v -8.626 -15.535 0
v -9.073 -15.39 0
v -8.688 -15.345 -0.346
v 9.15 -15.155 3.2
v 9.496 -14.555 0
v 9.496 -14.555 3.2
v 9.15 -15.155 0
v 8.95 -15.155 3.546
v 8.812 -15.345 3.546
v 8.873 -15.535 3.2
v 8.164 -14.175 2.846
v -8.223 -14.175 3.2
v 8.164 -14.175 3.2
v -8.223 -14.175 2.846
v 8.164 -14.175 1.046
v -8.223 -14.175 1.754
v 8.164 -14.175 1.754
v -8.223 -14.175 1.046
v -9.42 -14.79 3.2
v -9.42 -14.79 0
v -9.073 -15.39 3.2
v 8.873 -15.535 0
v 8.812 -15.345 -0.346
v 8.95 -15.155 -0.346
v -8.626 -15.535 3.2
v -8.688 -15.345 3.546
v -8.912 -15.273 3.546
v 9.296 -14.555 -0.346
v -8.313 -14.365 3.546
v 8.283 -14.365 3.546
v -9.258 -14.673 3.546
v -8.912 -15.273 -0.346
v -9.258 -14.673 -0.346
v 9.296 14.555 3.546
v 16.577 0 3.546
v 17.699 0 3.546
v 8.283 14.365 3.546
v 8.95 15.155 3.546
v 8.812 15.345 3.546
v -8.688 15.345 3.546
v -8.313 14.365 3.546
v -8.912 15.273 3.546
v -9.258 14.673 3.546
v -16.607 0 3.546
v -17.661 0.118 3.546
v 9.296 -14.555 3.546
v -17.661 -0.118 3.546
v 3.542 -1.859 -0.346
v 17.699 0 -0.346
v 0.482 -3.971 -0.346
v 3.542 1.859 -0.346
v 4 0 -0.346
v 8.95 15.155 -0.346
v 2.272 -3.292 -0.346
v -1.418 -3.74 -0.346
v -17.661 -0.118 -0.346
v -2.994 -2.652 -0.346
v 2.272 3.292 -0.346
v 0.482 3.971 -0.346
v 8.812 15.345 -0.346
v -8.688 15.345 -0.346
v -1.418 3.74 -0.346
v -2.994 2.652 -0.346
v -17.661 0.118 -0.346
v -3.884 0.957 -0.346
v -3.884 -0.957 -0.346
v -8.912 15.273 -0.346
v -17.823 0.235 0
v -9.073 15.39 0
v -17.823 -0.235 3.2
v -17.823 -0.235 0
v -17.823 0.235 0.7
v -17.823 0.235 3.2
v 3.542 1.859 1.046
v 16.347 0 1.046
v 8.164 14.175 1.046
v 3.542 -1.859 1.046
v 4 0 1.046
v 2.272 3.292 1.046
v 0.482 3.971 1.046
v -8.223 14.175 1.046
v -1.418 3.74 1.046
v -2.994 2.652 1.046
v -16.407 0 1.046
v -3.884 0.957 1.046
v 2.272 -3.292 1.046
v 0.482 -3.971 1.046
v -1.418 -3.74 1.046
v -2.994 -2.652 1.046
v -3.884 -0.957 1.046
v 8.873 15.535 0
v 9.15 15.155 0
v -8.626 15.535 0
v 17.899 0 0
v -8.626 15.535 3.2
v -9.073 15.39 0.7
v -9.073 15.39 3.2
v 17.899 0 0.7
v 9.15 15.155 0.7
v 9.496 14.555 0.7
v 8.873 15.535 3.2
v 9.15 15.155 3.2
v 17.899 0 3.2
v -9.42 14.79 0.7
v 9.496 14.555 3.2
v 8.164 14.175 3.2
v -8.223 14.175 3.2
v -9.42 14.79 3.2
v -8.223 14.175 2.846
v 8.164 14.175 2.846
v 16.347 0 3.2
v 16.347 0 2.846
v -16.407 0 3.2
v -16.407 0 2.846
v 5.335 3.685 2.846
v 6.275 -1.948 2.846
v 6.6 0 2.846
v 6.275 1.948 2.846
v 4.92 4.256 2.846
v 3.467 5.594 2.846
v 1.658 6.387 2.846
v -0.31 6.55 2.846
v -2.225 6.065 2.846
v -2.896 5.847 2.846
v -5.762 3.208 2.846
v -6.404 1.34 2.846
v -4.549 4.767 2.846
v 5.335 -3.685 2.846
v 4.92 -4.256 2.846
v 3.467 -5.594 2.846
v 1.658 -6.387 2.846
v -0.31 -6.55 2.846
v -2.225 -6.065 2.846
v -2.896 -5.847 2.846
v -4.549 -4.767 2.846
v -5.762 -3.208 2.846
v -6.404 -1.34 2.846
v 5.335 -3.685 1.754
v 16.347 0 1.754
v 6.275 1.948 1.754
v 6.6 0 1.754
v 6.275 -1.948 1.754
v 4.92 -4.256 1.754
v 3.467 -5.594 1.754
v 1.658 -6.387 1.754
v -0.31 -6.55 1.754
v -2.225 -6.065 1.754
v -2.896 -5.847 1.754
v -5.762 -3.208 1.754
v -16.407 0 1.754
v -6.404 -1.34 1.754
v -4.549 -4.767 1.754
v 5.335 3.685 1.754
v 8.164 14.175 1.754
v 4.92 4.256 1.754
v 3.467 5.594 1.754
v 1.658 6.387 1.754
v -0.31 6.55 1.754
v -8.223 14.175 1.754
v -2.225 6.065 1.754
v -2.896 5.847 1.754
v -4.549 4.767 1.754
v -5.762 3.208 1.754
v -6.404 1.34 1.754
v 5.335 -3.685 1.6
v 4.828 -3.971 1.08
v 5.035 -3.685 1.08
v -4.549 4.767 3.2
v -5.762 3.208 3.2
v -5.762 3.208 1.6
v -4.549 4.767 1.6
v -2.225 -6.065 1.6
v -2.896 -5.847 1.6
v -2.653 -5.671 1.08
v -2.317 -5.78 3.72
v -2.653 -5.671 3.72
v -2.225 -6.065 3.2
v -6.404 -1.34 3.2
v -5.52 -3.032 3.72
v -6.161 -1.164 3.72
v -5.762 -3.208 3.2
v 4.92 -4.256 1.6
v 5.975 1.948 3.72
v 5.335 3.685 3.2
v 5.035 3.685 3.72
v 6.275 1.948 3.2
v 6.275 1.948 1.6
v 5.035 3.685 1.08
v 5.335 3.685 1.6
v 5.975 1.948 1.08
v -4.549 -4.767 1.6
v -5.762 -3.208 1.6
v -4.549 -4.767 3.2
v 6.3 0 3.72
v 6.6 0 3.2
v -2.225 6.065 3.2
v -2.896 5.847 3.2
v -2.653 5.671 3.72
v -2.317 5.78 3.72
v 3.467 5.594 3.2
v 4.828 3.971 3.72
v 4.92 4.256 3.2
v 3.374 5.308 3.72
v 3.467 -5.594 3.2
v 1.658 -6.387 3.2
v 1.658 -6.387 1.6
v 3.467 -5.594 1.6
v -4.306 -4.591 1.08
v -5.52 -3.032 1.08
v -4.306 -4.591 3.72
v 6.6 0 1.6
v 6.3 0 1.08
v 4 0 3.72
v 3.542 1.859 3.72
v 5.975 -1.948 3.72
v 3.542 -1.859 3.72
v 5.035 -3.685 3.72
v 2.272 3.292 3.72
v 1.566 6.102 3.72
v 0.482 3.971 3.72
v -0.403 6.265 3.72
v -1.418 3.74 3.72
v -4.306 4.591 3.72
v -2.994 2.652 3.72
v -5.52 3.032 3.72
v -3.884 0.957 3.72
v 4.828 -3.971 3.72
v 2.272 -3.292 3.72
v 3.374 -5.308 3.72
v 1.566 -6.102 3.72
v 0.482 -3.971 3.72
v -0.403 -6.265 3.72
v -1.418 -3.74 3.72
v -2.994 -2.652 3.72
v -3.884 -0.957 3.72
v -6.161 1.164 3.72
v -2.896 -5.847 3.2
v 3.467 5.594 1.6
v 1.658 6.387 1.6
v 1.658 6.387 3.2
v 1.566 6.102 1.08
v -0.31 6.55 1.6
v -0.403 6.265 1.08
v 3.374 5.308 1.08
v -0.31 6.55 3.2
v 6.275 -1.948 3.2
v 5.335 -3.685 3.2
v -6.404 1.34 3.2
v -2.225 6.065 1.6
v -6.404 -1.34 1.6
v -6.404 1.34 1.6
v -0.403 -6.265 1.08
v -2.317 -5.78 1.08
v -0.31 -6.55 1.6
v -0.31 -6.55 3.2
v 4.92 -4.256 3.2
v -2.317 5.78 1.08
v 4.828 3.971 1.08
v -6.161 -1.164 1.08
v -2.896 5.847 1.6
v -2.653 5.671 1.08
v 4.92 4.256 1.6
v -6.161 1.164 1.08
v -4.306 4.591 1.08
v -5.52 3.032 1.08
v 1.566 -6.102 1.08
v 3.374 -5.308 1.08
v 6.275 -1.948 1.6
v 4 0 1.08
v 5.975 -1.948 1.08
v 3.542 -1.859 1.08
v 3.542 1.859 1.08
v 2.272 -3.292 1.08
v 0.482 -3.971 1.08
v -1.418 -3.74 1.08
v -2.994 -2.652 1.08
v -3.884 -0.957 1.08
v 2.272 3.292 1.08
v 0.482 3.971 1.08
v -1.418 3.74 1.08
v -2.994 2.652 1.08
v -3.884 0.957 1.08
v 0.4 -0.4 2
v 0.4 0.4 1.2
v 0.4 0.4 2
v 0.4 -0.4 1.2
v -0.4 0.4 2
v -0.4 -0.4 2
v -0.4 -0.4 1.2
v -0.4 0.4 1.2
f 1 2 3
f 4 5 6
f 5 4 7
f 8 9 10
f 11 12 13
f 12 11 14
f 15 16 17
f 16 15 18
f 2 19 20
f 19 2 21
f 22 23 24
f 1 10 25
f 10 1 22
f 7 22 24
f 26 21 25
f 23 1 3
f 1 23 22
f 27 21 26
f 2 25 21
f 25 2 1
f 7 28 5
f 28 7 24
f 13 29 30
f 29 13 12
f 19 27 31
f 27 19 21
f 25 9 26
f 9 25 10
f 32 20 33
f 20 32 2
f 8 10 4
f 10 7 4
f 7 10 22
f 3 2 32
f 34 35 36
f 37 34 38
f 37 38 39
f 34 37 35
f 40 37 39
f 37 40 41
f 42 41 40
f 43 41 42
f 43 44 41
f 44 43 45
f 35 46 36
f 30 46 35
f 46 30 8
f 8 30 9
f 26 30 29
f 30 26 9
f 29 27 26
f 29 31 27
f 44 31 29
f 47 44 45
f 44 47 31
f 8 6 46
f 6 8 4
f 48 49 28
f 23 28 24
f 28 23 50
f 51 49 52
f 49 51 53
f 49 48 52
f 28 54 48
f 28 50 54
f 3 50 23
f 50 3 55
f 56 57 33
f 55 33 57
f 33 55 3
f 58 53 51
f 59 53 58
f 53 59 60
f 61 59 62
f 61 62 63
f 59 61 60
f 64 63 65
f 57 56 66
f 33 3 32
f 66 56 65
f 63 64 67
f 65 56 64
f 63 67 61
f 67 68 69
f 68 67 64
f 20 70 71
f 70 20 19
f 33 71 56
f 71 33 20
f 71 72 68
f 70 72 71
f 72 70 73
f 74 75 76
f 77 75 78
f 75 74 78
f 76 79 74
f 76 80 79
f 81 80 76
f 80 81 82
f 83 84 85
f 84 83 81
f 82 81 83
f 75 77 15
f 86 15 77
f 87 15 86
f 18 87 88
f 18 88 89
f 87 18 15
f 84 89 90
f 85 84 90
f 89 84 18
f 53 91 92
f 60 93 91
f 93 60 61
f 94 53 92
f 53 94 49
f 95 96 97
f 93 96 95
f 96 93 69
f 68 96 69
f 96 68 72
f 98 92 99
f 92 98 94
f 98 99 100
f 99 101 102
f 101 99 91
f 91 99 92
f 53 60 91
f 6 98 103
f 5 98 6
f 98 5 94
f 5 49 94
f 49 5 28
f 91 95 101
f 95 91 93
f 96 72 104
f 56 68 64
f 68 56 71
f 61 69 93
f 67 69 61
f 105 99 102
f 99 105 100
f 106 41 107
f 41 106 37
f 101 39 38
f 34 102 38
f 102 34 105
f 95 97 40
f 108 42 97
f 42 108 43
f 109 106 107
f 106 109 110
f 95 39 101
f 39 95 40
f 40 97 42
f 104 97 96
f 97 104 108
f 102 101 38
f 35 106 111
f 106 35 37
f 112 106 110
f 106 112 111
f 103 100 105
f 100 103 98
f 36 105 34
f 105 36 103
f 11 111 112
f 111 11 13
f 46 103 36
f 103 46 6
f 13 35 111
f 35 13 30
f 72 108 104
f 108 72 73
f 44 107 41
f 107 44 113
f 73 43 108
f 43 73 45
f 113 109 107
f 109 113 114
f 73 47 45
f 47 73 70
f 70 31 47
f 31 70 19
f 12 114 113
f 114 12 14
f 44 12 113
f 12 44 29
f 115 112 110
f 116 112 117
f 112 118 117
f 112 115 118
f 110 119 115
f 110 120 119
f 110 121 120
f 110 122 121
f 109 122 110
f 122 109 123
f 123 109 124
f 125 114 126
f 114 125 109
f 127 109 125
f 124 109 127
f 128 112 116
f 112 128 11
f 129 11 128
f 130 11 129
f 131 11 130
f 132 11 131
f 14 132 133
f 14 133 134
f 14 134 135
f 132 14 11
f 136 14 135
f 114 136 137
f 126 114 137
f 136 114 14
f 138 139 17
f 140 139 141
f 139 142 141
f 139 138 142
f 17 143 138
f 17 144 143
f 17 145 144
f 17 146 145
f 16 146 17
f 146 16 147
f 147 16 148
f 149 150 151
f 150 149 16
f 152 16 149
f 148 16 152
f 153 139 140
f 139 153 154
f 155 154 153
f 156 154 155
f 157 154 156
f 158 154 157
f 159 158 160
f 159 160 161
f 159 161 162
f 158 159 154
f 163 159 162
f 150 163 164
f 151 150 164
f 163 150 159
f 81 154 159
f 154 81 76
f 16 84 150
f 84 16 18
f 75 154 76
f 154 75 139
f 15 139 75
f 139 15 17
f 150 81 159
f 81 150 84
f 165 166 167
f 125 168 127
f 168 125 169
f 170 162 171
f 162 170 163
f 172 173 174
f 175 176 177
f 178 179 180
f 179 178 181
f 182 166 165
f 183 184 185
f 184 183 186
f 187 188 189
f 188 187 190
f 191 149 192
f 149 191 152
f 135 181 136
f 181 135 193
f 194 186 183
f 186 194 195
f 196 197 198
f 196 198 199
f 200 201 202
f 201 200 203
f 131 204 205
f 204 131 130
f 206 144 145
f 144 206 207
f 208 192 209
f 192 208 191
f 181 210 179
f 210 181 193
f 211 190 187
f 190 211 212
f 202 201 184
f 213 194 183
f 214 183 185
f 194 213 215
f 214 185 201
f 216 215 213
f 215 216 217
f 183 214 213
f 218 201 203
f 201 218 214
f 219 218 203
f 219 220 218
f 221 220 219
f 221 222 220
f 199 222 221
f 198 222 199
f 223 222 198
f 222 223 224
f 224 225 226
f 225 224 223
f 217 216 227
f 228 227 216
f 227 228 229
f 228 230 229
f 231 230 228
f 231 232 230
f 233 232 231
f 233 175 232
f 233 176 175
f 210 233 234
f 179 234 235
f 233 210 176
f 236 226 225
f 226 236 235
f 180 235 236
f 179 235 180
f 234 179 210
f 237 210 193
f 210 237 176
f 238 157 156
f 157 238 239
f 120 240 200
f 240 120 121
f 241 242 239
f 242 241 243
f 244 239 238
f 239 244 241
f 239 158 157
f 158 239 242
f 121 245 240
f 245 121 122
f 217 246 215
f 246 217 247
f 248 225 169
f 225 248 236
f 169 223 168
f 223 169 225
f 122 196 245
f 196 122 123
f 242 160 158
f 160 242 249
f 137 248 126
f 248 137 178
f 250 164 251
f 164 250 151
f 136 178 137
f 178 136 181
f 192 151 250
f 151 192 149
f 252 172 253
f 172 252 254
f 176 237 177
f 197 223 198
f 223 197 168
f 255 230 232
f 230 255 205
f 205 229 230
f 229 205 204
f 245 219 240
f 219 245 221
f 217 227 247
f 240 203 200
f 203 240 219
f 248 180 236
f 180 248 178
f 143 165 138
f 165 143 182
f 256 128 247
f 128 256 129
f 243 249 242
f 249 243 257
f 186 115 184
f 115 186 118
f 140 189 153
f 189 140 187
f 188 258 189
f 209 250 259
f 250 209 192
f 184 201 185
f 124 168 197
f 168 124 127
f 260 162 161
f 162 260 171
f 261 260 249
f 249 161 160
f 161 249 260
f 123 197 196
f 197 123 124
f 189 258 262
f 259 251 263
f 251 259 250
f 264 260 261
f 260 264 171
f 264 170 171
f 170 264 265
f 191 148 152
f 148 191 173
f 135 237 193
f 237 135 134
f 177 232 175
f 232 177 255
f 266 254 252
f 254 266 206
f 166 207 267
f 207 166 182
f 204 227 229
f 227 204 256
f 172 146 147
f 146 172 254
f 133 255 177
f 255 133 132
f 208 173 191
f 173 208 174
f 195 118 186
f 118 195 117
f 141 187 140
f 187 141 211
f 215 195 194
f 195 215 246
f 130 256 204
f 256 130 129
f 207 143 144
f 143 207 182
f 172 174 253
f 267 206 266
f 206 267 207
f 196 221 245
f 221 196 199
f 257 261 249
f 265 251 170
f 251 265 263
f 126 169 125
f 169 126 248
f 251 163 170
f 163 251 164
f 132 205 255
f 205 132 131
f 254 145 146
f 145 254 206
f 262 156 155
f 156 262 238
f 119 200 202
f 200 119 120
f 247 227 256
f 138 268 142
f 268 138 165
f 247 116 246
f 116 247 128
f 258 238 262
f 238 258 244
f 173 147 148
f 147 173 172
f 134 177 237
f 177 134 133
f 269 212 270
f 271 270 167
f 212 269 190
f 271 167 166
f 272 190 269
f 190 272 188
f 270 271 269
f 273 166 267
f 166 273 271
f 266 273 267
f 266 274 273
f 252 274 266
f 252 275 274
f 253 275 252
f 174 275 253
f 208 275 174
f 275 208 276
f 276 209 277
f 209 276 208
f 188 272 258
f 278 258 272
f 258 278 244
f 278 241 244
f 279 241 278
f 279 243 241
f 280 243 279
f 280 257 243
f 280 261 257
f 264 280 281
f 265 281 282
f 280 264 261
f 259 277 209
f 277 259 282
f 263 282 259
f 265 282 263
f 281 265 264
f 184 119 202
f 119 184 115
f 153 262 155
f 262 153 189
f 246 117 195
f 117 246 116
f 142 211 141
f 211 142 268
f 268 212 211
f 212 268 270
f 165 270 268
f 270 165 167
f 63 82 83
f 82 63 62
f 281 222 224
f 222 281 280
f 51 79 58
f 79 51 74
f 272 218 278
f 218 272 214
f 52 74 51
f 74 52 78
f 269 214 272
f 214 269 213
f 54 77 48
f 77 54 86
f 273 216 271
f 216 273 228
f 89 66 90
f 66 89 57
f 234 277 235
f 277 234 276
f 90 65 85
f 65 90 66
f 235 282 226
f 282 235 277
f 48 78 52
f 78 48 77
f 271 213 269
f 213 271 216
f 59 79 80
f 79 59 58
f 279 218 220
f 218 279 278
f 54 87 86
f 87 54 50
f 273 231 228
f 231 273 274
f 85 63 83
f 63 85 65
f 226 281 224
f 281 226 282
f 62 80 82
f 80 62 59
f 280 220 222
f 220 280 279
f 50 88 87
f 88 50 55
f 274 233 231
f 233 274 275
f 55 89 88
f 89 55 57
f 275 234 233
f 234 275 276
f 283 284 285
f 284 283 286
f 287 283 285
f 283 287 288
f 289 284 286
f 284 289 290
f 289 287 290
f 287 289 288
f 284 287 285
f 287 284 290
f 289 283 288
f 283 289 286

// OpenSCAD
// Parameters
bbox_X = 35.0; //[17.5:70.0:0.1]
bbox_Y = 30.31; //[15.155:60.62:0.01]
bbox_Z = 4.0; //[2.0:8.0:0.1]
plate_thk = 3.2; //[1.6:6.4:0.1]
hex_flat_to_flat = 30.31; //[15.155:60.62:0.01]
hole_d = 8.0; //[4.0:16.0:0.1]
boss_thk = 0.8; //[0.4:1.6:0.05]
boss_r = 6.0; //[3.0:12.0:0.1]
boss_offset_x = 0.0; //[-10.0:10.0:0.1]
boss_offset_y = 0.0; //[-10.0:10.0:0.1]
boss_on_top = 1; //[0:1:1]
eps_overlap = 0.8; //[0.5:2.0:0.1]
hex_circum_r = 17.5; //[8.75:35.0:0.01]
edge_chamfer_h = 0.6; //[0.3:1.2:0.05]
edge_fillet_r = 0.4; //[0.2:1.0:0.05]
boss_blend_r = 0.6; //[0.3:1.5:0.05]

// Hexagon profile
module hex_profile() {
  polygon(points=[
    [hex_flat_to_flat/sqrt(3), 0],
    [hex_flat_to_flat/(2*sqrt(3)), hex_flat_to_flat/2],
    [-hex_flat_to_flat/(2*sqrt(3)), hex_flat_to_flat/2],
    [-hex_flat_to_flat/sqrt(3), 0],
    [-hex_flat_to_flat/(2*sqrt(3)), -hex_flat_to_flat/2],
    [hex_flat_to_flat/(2*sqrt(3)), -hex_flat_to_flat/2]
  ]);
}

// Main hex plate
module hex_plate_main_body() {
  linear_extrude(height=plate_thk)
    hex_profile();
}

// Centered through-hole
module center_through_hole() {
  translate([0, 0, plate_thk/2])
    cylinder(r=hole_d/2, h=bbox_Z + 2*eps_overlap, center=true);
}

// Localized step/boss pad
module localized_step_boss_pad_raw() {
  translate([boss_offset_x, boss_offset_y, plate_thk - (boss_thk + eps_overlap)/2])
    cylinder(r=boss_r, h=boss_thk + eps_overlap, center=true);
}

// Edge chamfer tool
module edge_chamfer_tool_top() {
  linear_extrude(height=edge_chamfer_h + eps_overlap)
    hex_profile();
}

module edge_chamfer_tool_bottom() {
  linear_extrude(height=edge_chamfer_h + eps_overlap)
    hex_profile();
}

// Edge fillet sphere
module edge_fillet_sphere() {
  sphere(r=edge_fillet_r);
}

// Boss blend sphere
module boss_blend_sphere() {
  sphere(r=boss_blend_r);
}

// Engraving mark
module engraving_mark() {
  translate([0, 0, plate_thk/2])
    cube([eps_overlap, eps_overlap, eps_overlap], center=true);
}

// Operations
module edge_chamfer_tool_top_scaled() {
  scale([(hex_flat_to_flat - 2*edge_chamfer_h)/hex_flat_to_flat, (hex_flat_to_flat - 2*edge_chamfer_h)/hex_flat_to_flat, 1])
    edge_chamfer_tool_top();
}

module edge_chamfer_tool_top_pos() {
  translate([0, 0, plate_thk - (edge_chamfer_h + eps_overlap)/2])
    edge_chamfer_tool_top_scaled();
}

module edge_chamfer_tool_bottom_scaled() {
  scale([(hex_flat_to_flat - 2*edge_chamfer_h)/hex_flat_to_flat, (hex_flat_to_flat - 2*edge_chamfer_h)/hex_flat_to_flat, 1])
    edge_chamfer_tool_bottom();
}

module edge_chamfer_tool_bottom_pos() {
  translate([0, 0, (edge_chamfer_h + eps_overlap)/2])
    edge_chamfer_tool_bottom_scaled();
}

module hex_plate_with_chamfer() {
  difference() {
    hex_plate_main_body();
    edge_chamfer_tool_top_pos();
    edge_chamfer_tool_bottom_pos();
  }
}

module hex_plate_edge_fillet() {
  minkowski() {
    hex_plate_with_chamfer();
    edge_fillet_sphere();
  }
}

module boss_blend_fillet() {
  minkowski() {
    localized_step_boss_pad_raw();
    boss_blend_sphere();
  }
}

module plate_plus_boss() {
  union() {
    hex_plate_edge_fillet();
    boss_blend_fillet();
  }
}

module plate_with_hole() {
  difference() {
    plate_plus_boss();
    center_through_hole();
  }
}

module complete_model() {
  union() {
    plate_with_hole();
    engraving_mark();
  }
}

// Final output
complete_model();
